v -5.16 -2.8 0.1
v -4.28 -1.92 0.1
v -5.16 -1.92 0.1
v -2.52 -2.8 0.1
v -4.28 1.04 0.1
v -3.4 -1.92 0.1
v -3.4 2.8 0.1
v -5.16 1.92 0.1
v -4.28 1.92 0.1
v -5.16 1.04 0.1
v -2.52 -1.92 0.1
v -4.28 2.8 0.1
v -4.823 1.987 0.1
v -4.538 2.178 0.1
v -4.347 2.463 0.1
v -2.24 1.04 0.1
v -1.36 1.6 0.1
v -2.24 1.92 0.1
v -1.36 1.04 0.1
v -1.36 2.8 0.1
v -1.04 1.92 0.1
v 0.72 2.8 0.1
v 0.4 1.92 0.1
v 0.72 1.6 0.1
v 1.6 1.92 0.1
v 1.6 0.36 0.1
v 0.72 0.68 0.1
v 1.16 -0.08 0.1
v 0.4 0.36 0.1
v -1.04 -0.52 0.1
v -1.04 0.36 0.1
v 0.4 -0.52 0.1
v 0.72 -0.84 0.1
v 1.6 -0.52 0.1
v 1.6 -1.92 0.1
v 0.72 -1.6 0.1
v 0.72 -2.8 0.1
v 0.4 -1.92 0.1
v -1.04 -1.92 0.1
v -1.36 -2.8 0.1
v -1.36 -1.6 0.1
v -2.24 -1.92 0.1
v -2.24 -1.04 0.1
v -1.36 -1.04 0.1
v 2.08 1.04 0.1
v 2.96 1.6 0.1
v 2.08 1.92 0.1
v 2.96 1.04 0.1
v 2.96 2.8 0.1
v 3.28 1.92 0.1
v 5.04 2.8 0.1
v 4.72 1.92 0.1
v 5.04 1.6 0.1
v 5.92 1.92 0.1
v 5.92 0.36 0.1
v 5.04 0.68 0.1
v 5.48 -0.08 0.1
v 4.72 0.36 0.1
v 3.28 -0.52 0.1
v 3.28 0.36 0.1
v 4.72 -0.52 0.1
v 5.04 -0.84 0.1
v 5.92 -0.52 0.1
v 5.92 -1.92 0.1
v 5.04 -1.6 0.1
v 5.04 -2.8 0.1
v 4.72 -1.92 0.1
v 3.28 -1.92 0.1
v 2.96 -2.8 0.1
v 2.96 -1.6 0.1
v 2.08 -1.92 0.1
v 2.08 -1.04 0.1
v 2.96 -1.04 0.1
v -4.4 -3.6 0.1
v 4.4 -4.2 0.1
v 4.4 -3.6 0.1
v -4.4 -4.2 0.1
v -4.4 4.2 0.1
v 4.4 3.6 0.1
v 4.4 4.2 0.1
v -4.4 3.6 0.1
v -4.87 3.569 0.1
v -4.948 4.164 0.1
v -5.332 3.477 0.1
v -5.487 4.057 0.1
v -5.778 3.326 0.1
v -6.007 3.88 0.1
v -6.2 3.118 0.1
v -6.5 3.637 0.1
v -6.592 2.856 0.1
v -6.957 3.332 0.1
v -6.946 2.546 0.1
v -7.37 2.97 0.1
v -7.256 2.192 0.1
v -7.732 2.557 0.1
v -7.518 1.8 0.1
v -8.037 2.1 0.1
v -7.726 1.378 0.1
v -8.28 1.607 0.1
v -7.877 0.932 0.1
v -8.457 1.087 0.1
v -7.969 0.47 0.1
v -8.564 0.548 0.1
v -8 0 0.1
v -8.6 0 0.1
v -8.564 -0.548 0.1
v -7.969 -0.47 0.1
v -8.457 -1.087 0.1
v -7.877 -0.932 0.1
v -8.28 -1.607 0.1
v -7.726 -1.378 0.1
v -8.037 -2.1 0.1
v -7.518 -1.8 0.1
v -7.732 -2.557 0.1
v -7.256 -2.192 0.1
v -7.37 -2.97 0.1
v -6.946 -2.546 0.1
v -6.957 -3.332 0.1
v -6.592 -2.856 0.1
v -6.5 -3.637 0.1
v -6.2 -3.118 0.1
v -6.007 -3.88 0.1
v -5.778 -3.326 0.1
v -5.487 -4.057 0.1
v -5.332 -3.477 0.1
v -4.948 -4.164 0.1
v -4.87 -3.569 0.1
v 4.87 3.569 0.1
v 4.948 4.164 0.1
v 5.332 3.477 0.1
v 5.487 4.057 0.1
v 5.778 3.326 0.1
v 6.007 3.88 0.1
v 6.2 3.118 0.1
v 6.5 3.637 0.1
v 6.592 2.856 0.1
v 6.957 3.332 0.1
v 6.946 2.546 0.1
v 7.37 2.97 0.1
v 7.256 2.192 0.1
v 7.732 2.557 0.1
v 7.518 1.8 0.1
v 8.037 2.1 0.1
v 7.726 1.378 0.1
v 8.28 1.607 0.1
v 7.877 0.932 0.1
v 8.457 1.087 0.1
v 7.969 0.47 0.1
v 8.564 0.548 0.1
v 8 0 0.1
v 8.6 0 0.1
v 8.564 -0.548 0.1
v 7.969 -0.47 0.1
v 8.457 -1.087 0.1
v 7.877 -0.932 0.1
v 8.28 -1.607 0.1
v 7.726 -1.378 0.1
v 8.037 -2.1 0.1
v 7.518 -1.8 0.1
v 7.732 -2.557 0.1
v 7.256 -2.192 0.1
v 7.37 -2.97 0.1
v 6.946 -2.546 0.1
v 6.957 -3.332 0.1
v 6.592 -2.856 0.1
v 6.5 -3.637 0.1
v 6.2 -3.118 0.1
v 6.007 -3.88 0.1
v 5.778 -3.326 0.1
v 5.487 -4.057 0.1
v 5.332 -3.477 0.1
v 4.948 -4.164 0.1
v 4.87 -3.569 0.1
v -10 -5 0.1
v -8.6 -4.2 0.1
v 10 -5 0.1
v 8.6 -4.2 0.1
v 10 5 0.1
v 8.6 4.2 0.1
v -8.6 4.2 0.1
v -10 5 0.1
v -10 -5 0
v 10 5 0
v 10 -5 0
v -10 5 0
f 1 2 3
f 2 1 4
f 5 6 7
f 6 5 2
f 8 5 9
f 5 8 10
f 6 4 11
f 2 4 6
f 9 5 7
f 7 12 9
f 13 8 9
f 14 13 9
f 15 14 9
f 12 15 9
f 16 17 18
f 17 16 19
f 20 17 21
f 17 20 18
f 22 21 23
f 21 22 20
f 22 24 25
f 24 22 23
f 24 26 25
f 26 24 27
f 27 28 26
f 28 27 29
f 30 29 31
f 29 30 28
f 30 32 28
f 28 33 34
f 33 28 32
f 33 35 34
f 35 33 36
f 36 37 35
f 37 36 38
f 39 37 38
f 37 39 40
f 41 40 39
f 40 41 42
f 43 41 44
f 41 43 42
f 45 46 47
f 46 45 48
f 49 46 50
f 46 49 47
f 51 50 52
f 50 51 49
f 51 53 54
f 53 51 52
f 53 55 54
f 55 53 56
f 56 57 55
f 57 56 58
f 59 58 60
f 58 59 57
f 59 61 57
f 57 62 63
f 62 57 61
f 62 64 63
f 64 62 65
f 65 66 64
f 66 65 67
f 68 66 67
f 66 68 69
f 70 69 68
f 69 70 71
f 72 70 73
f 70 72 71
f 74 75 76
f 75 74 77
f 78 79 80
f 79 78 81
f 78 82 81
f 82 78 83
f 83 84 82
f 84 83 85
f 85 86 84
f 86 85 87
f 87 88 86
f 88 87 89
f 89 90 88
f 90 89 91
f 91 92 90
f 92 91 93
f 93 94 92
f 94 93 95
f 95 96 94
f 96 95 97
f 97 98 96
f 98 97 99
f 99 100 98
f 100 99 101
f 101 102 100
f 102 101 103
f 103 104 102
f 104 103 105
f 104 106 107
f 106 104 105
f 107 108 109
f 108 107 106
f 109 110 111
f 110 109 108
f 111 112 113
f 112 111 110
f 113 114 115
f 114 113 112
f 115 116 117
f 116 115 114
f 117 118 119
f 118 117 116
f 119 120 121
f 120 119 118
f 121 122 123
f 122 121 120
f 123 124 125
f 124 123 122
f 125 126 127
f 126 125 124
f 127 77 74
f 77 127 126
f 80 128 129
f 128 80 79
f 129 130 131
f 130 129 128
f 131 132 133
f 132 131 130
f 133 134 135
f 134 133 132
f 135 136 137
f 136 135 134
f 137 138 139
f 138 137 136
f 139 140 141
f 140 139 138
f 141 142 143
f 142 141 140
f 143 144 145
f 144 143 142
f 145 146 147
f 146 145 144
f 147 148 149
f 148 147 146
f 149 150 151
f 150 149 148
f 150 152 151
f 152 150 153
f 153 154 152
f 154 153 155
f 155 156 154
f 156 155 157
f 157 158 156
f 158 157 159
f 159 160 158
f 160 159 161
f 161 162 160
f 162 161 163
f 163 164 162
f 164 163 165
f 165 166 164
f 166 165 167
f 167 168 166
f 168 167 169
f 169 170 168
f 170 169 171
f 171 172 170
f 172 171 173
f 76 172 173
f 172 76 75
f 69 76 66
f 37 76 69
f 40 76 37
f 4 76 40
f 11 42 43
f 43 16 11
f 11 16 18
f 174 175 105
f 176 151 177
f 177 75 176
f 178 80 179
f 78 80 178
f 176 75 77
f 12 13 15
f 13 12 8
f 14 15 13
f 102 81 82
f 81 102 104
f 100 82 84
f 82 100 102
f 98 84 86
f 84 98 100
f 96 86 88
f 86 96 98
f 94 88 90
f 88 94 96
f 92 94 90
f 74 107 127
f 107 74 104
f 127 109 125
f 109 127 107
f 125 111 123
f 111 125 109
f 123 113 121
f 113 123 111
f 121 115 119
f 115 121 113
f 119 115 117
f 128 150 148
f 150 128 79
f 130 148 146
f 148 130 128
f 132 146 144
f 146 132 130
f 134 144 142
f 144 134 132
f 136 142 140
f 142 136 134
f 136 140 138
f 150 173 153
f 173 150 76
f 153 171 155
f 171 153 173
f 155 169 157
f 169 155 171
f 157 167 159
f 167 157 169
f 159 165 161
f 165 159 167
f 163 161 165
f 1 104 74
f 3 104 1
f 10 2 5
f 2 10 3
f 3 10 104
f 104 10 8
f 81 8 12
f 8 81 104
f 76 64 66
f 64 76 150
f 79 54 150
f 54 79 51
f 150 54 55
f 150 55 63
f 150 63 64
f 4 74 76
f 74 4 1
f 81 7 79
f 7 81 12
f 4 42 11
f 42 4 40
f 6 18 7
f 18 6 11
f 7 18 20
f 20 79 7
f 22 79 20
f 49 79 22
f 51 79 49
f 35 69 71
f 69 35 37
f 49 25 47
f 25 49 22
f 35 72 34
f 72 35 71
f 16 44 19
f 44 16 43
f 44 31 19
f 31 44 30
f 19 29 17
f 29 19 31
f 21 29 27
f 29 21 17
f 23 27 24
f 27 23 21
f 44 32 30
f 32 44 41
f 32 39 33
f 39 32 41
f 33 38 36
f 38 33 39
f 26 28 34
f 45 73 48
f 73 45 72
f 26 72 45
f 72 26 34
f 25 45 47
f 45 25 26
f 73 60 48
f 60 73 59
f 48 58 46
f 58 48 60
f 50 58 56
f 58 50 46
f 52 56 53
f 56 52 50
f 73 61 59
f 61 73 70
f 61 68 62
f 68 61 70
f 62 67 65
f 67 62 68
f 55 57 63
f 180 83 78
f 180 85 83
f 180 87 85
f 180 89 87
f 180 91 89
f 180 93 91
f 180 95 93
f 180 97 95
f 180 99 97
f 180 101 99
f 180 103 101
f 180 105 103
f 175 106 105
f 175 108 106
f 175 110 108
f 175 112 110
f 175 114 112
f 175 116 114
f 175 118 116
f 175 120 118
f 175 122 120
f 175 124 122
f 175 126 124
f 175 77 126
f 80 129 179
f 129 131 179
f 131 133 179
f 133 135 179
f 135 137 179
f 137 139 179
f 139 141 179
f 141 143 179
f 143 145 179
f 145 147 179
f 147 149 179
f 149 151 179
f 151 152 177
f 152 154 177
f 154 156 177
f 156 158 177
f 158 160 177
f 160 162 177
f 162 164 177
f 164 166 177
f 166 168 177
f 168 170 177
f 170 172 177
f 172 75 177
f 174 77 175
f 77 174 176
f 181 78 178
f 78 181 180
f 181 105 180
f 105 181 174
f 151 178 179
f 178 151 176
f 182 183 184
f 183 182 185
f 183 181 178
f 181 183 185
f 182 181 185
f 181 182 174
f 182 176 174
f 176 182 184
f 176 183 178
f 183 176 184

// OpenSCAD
// file: ../p/box5-12.scad
use <../lib.scad>
function ldraw_lib__box5_12() = [
// 0 Box with 5 Faces without Any Edges
// 0 Name: box5-12.dat
// 0 Author: Chris Dee [cwdee]
// 0 !LDRAW_ORG Primitive UPDATE 2009-02
// 0 !LICENSE Licensed under CC BY 2.0 and CC BY 4.0 : see CAreadme.txt
// 
// 0 BFC CERTIFY CCW
  [0,"BFC","CERTIFY"],
  [0,"BFC","CCW"],
// 
// 0 !HISTORY 2009-09-03 [PTadmin] Official Update 2009-02
// 
// 
// 4 16 1 1 1 1 1 -1 -1 1 -1 -1 1 1
  [4,16,1,1,1,1,1,-1,-1,1,-1,-1,1,1],
// 4 16 -1 0 1 1 0 1 1 1 1 -1 1 1
  [4,16,-1,0,1,1,0,1,1,1,1,-1,1,1],
// 4 16 -1 0 -1 -1 0 1 -1 1 1 -1 1 -1
  [4,16,-1,0,-1,-1,0,1,-1,1,1,-1,1,-1],
// 4 16 1 0 -1 -1 0 -1 -1 1 -1 1 1 -1
  [4,16,1,0,-1,-1,0,-1,-1,1,-1,1,1,-1],
// 4 16 1 0 1 1 0 -1 1 1 -1 1 1 1
  [4,16,1,0,1,1,0,-1,1,1,-1,1,1,1],
// 0
];
makepoly(ldraw_lib__box5_12(), line=0.2);
// file: ../p/48/2-4ring6.scad
use <../../lib.scad>
function ldraw_lib__48__2_4ring6() = [
// 0 Hi-Res Ring  6 x 0.5
// 0 Name: 48\2-4ring6.dat
// 0 Author: Guy Vivan [guyvivan]
// 0 !LDRAW_ORG 48_Primitive UPDATE 2009-01
// 0 !LICENSE Licensed under CC BY 2.0 and CC BY 4.0 : see CAreadme.txt
// 
// 0 BFC CERTIFY CCW
  [0,"BFC","CERTIFY"],
  [0,"BFC","CCW"],
// 
// 0 !HISTORY 2009-05-02 [PTadmin] Official Update 2009-01
// 
// 
// 4 16 6 0 0 7 0 0 6.9398 0 0.9135 5.9484 0 0.783
  [4,16,6,0,0,7,0,0,6.9398,0,0.9135,5.9484,0,0.783],
// 4 16 5.9484 0 0.783 6.9398 0 0.9135 6.7613 0 1.8116 5.7954 0 1.5528
  [4,16,5.9484,0,0.783,6.9398,0,0.9135,6.7613,0,1.8116,5.7954,0,1.5528],
// 4 16 5.7954 0 1.5528 6.7613 0 1.8116 6.4673 0 2.6789 5.5434 0 2.2962
  [4,16,5.7954,0,1.5528,6.7613,0,1.8116,6.4673,0,2.6789,5.5434,0,2.2962],
// 4 16 5.5434 0 2.2962 6.4673 0 2.6789 6.062 0 3.5 5.196 0 3
  [4,16,5.5434,0,2.2962,6.4673,0,2.6789,6.062,0,3.5,5.196,0,3],
// 4 16 5.196 0 3 6.062 0 3.5 5.5538 0 4.2616 4.7604 0 3.6528
  [4,16,5.196,0,3,6.062,0,3.5,5.5538,0,4.2616,4.7604,0,3.6528],
// 4 16 4.7604 0 3.6528 5.5538 0 4.2616 4.9497 0 4.9497 4.2426 0 4.2426
  [4,16,4.7604,0,3.6528,5.5538,0,4.2616,4.9497,0,4.9497,4.2426,0,4.2426],
// 4 16 4.2426 0 4.2426 4.9497 0 4.9497 4.2616 0 5.5538 3.6528 0 4.7604
  [4,16,4.2426,0,4.2426,4.9497,0,4.9497,4.2616,0,5.5538,3.6528,0,4.7604],
// 4 16 3.6528 0 4.7604 4.2616 0 5.5538 3.5 0 6.062 3 0 5.196
  [4,16,3.6528,0,4.7604,4.2616,0,5.5538,3.5,0,6.062,3,0,5.196],
// 4 16 3 0 5.196 3.5 0 6.062 2.6789 0 6.4673 2.2962 0 5.5434
  [4,16,3,0,5.196,3.5,0,6.062,2.6789,0,6.4673,2.2962,0,5.5434],
// 4 16 2.2962 0 5.5434 2.6789 0 6.4673 1.8116 0 6.7613 1.5528 0 5.7954
  [4,16,2.2962,0,5.5434,2.6789,0,6.4673,1.8116,0,6.7613,1.5528,0,5.7954],
// 4 16 1.5528 0 5.7954 1.8116 0 6.7613 0.9135 0 6.9398 0.783 0 5.9484
  [4,16,1.5528,0,5.7954,1.8116,0,6.7613,0.9135,0,6.9398,0.783,0,5.9484],
// 4 16 0.783 0 5.9484 0.9135 0 6.9398 0 0 7 0 0 6
  [4,16,0.783,0,5.9484,0.9135,0,6.9398,0,0,7,0,0,6],
// 4 16 0 0 6 0 0 7 -0.9135 0 6.9398 -0.783 0 5.9484
  [4,16,0,0,6,0,0,7,-0.9135,0,6.9398,-0.783,0,5.9484],
// 4 16 -0.783 0 5.9484 -0.9135 0 6.9398 -1.8116 0 6.7613 -1.5528 0 5.7954
  [4,16,-0.783,0,5.9484,-0.9135,0,6.9398,-1.8116,0,6.7613,-1.5528,0,5.7954],
// 4 16 -1.5528 0 5.7954 -1.8116 0 6.7613 -2.6789 0 6.4673 -2.2962 0 5.5434
  [4,16,-1.5528,0,5.7954,-1.8116,0,6.7613,-2.6789,0,6.4673,-2.2962,0,5.5434],
// 4 16 -2.2962 0 5.5434 -2.6789 0 6.4673 -3.5 0 6.062 -3 0 5.196
  [4,16,-2.2962,0,5.5434,-2.6789,0,6.4673,-3.5,0,6.062,-3,0,5.196],
// 4 16 -3 0 5.196 -3.5 0 6.062 -4.2616 0 5.5538 -3.6528 0 4.7604
  [4,16,-3,0,5.196,-3.5,0,6.062,-4.2616,0,5.5538,-3.6528,0,4.7604],
// 4 16 -3.6528 0 4.7604 -4.2616 0 5.5538 -4.9497 0 4.9497 -4.2426 0 4.2426
  [4,16,-3.6528,0,4.7604,-4.2616,0,5.5538,-4.9497,0,4.9497,-4.2426,0,4.2426],
// 4 16 -4.2426 0 4.2426 -4.9497 0 4.9497 -5.5538 0 4.2616 -4.7604 0 3.6528
  [4,16,-4.2426,0,4.2426,-4.9497,0,4.9497,-5.5538,0,4.2616,-4.7604,0,3.6528],
// 4 16 -4.7604 0 3.6528 -5.5538 0 4.2616 -6.062 0 3.5 -5.196 0 3
  [4,16,-4.7604,0,3.6528,-5.5538,0,4.2616,-6.062,0,3.5,-5.196,0,3],
// 4 16 -5.196 0 3 -6.062 0 3.5 -6.4673 0 2.6789 -5.5434 0 2.2962
  [4,16,-5.196,0,3,-6.062,0,3.5,-6.4673,0,2.6789,-5.5434,0,2.2962],
// 4 16 -5.5434 0 2.2962 -6.4673 0 2.6789 -6.7613 0 1.8116 -5.7954 0 1.5528
  [4,16,-5.5434,0,2.2962,-6.4673,0,2.6789,-6.7613,0,1.8116,-5.7954,0,1.5528],
// 4 16 -5.7954 0 1.5528 -6.7613 0 1.8116 -6.9398 0 0.9135 -5.9484 0 0.783
  [4,16,-5.7954,0,1.5528,-6.7613,0,1.8116,-6.9398,0,0.9135,-5.9484,0,0.783],
// 4 16 -5.9484 0 0.783 -6.9398 0 0.9135 -7 0 0 -6 0 0
  [4,16,-5.9484,0,0.783,-6.9398,0,0.9135,-7,0,0,-6,0,0],
// 
// 0 end of file
// 
];
makepoly(ldraw_lib__48__2_4ring6(), line=0.2);
// file: ../p/48/2-4ndis.scad
use <../../lib.scad>
function ldraw_lib__48__2_4ndis() = [
// 0 Hi-Res Disc Negative 0.5
// 0 Name: 48\2-4ndis.dat
// 0 Author: Guy Vivan [guyvivan]
// 0 !LDRAW_ORG 48_Primitive UPDATE 2009-01
// 0 !LICENSE Licensed under CC BY 2.0 and CC BY 4.0 : see CAreadme.txt
// 
// 0 BFC CERTIFY CCW
  [0,"BFC","CERTIFY"],
  [0,"BFC","CCW"],
// 
// 0 !HISTORY 2009-05-02 [PTadmin] Official Update 2009-01
// 
// 
// 3 16 1 0 1 0.9914 0 0.1305 1 0 0
  [3,16,1,0,1,0.9914,0,0.1305,1,0,0],
// 3 16 1 0 1 0.9659 0 0.2588 0.9914 0 0.1305
  [3,16,1,0,1,0.9659,0,0.2588,0.9914,0,0.1305],
// 3 16 1 0 1 0.9239 0 0.3827 0.9659 0 0.2588
  [3,16,1,0,1,0.9239,0,0.3827,0.9659,0,0.2588],
// 3 16 1 0 1 0.866 0 0.5 0.9239 0 0.3827
  [3,16,1,0,1,0.866,0,0.5,0.9239,0,0.3827],
// 3 16 1 0 1 0.7934 0 0.6088 0.866 0 0.5
  [3,16,1,0,1,0.7934,0,0.6088,0.866,0,0.5],
// 3 16 1 0 1 0.7071 0 0.7071 0.7934 0 0.6088
  [3,16,1,0,1,0.7071,0,0.7071,0.7934,0,0.6088],
// 3 16 1 0 1 0.6088 0 0.7934 0.7071 0 0.7071
  [3,16,1,0,1,0.6088,0,0.7934,0.7071,0,0.7071],
// 3 16 1 0 1 0.5 0 0.866 0.6088 0 0.7934
  [3,16,1,0,1,0.5,0,0.866,0.6088,0,0.7934],
// 3 16 1 0 1 0.3827 0 0.9239 0.5 0 0.866
  [3,16,1,0,1,0.3827,0,0.9239,0.5,0,0.866],
// 3 16 1 0 1 0.2588 0 0.9659 0.3827 0 0.9239
  [3,16,1,0,1,0.2588,0,0.9659,0.3827,0,0.9239],
// 3 16 1 0 1 0.1305 0 0.9914 0.2588 0 0.9659
  [3,16,1,0,1,0.1305,0,0.9914,0.2588,0,0.9659],
// 3 16 1 0 1 0 0 1 0.1305 0 0.9914
  [3,16,1,0,1,0,0,1,0.1305,0,0.9914],
// 3 16 -1 0 1 -0.1305 0 0.9914 0 0 1
  [3,16,-1,0,1,-0.1305,0,0.9914,0,0,1],
// 3 16 -1 0 1 -0.2588 0 0.9659 -0.1305 0 0.9914
  [3,16,-1,0,1,-0.2588,0,0.9659,-0.1305,0,0.9914],
// 3 16 -1 0 1 -0.3827 0 0.9239 -0.2588 0 0.9659
  [3,16,-1,0,1,-0.3827,0,0.9239,-0.2588,0,0.9659],
// 3 16 -1 0 1 -0.5 0 0.866 -0.3827 0 0.9239
  [3,16,-1,0,1,-0.5,0,0.866,-0.3827,0,0.9239],
// 3 16 -1 0 1 -0.6088 0 0.7934 -0.5 0 0.866
  [3,16,-1,0,1,-0.6088,0,0.7934,-0.5,0,0.866],
// 3 16 -1 0 1 -0.7071 0 0.7071 -0.6088 0 0.7934
  [3,16,-1,0,1,-0.7071,0,0.7071,-0.6088,0,0.7934],
// 3 16 -1 0 1 -0.7934 0 0.6088 -0.7071 0 0.7071
  [3,16,-1,0,1,-0.7934,0,0.6088,-0.7071,0,0.7071],
// 3 16 -1 0 1 -0.866 0 0.5 -0.7934 0 0.6088
  [3,16,-1,0,1,-0.866,0,0.5,-0.7934,0,0.6088],
// 3 16 -1 0 1 -0.9239 0 0.3827 -0.866 0 0.5
  [3,16,-1,0,1,-0.9239,0,0.3827,-0.866,0,0.5],
// 3 16 -1 0 1 -0.9659 0 0.2588 -0.9239 0 0.3827
  [3,16,-1,0,1,-0.9659,0,0.2588,-0.9239,0,0.3827],
// 3 16 -1 0 1 -0.9914 0 0.1305 -0.9659 0 0.2588
  [3,16,-1,0,1,-0.9914,0,0.1305,-0.9659,0,0.2588],
// 3 16 -1 0 1 -1 0 0 -0.9914 0 0.1305
  [3,16,-1,0,1,-1,0,0,-0.9914,0,0.1305],
// 
// 0 end of file
// 
];
makepoly(ldraw_lib__48__2_4ndis(), line=0.2);
// file: ../p/48/1-4chrd.scad
use <../../lib.scad>
function ldraw_lib__48__1_4chrd() = [
// 0 Hi-Res Chord 0.25
// 0 Name: 48\1-4chrd.dat
// 0 Author: Andy Westrate [westrate]
// 0 !LDRAW_ORG 48_Primitive UPDATE 2012-02
// 0 !LICENSE Licensed under CC BY 2.0 and CC BY 4.0 : see CAreadme.txt
// 
// 0 BFC CERTIFY CCW
  [0,"BFC","CERTIFY"],
  [0,"BFC","CCW"],
// 
// 0 !HISTORY 2009-05-02 [PTadmin] Official Update 2009-01
// 0 !HISTORY 2012-08-02 [MMR1988] Re-creation with PrimGen2 and Rectifier
// 0 !HISTORY 2012-08-09 [PTadmin] Official Update 2012-02
// 
// 
// 4 16 0.9914 0 0.1305 0.1305 0 0.9914 0 0 1 1 0 0
  [4,16,0.9914,0,0.1305,0.1305,0,0.9914,0,0,1,1,0,0],
// 4 16 0.9659 0 0.2588 0.2588 0 0.9659 0.1305 0 0.9914 0.9914 0 0.1305
  [4,16,0.9659,0,0.2588,0.2588,0,0.9659,0.1305,0,0.9914,0.9914,0,0.1305],
// 4 16 0.9239 0 0.3827 0.3827 0 0.9239 0.2588 0 0.9659 0.9659 0 0.2588
  [4,16,0.9239,0,0.3827,0.3827,0,0.9239,0.2588,0,0.9659,0.9659,0,0.2588],
// 4 16 0.866 0 0.5 0.5 0 0.866 0.3827 0 0.9239 0.9239 0 0.3827
  [4,16,0.866,0,0.5,0.5,0,0.866,0.3827,0,0.9239,0.9239,0,0.3827],
// 4 16 0.7934 0 0.6088 0.6088 0 0.7934 0.5 0 0.866 0.866 0 0.5
  [4,16,0.7934,0,0.6088,0.6088,0,0.7934,0.5,0,0.866,0.866,0,0.5],
// 3 16 0.7071 0 0.7071 0.6088 0 0.7934 0.7934 0 0.6088
  [3,16,0.7071,0,0.7071,0.6088,0,0.7934,0.7934,0,0.6088],
];
makepoly(ldraw_lib__48__1_4chrd(), line=0.2);
// file: ../p/1-4ndis.scad
use <../lib.scad>
function ldraw_lib__1_4ndis() = [
// 0 Disc Negative 0.25
// 0 Name: 1-4ndis.dat
// 0 Author: James Jessiman
// 0 !LDRAW_ORG Primitive UPDATE 2012-01
// 0 !LICENSE Licensed under CC BY 2.0 and CC BY 4.0 : see CAreadme.txt
// 
// 0 BFC CERTIFY CCW
  [0,"BFC","CERTIFY"],
  [0,"BFC","CCW"],
// 
// 0 !HISTORY 2002-03-23 [sbliss] Added BFC Statement
// 0 !HISTORY 2002-04-25 [PTadmin] Official Update 2002-02
// 0 !HISTORY 2007-06-22 [PTadmin] Header formatted for Contributor Agreement
// 0 !HISTORY 2008-07-01 [PTadmin] Official Update 2008-01
// 0 !HISTORY 2012-02-16 [Philo] Changed to CCW
// 0 !HISTORY 2012-03-30 [PTadmin] Official Update 2012-01
// 
// 
// 3 16 0.9239 0 0.3827 1 0 0 1 0 1
  [3,16,0.9239,0,0.3827,1,0,0,1,0,1],
// 3 16 0.7071 0 0.7071 0.9239 0 0.3827 1 0 1
  [3,16,0.7071,0,0.7071,0.9239,0,0.3827,1,0,1],
// 3 16 0.3827 0 0.9239 0.7071 0 0.7071 1 0 1
  [3,16,0.3827,0,0.9239,0.7071,0,0.7071,1,0,1],
// 3 16 0 0 1 0.3827 0 0.9239 1 0 1
  [3,16,0,0,1,0.3827,0,0.9239,1,0,1],
];
makepoly(ldraw_lib__1_4ndis(), line=0.2);
// file: ../p/1-4chrd.scad
use <../lib.scad>
function ldraw_lib__1_4chrd() = [
// 0 Chord 0.25
// 0 Name: 1-4chrd.dat
// 0 Author: Tony Hafner [hafhead]
// 0 !LDRAW_ORG Primitive UPDATE 2012-02
// 0 !LICENSE Licensed under CC BY 2.0 and CC BY 4.0 : see CAreadme.txt
// 
// 0 BFC CERTIFY CCW
  [0,"BFC","CERTIFY"],
  [0,"BFC","CCW"],
// 
// 0 !HISTORY 2004-04-22 [PTadmin] Official Update 2004-02
// 0 !HISTORY 2007-10-09 [PTadmin] Header formatted for Contributor Agreement
// 0 !HISTORY 2008-07-01 [PTadmin] Official Update 2008-01
// 0 !HISTORY 2012-08-02 [MMR1988] Re-creation with PrimGen2 and Rectifier
// 0 !HISTORY 2012-08-09 [PTadmin] Official Update 2012-02
// 
// 
// 4 16 0.9239 0 0.3827 0.3827 0 0.9239 0 0 1 1 0 0
  [4,16,0.9239,0,0.3827,0.3827,0,0.9239,0,0,1,1,0,0],
// 3 16 0.7071 0 0.7071 0.3827 0 0.9239 0.9239 0 0.3827
  [3,16,0.7071,0,0.7071,0.3827,0,0.9239,0.9239,0,0.3827],
];
makepoly(ldraw_lib__1_4chrd(), line=0.2);
// main file
use <../lib.scad>
use <../p/1-4chrd.scad>
use <../p/1-4ndis.scad>
use <../p/48/1-4chrd.scad>
use <../p/48/2-4ndis.scad>
use <../p/48/2-4ring6.scad>
use <../p/box5-12.scad>
function ldraw_lib__004587a() = [
// 0 Sticker  1.2 x  2.6 with White "133" on Black
// 0 Name: 004587a.dat
// 0 Author: Niels Karsdorp [nielsk]
// 0 !LDRAW_ORG Part UPDATE 2020-01
// 0 !LICENSE Licensed under CC BY 2.0 and CC BY 4.0 : see CAreadme.txt
// 
// 0 BFC CERTIFY CCW
  [0,"BFC","CERTIFY"],
  [0,"BFC","CCW"],
// 
// 0 !KEYWORDS set 133, Train
// 
// 0 !HISTORY 2010-07-05 [PTadmin] Official Update 2010-02
// 0 !HISTORY 2016-07-01 [cwdee] Updated description
// 0 !HISTORY 2016-12-31 [PTadmin] Official Update 2016-01
// 0 !HISTORY 2019-08-10 [anathema] Corrected colour of backing box and replaced with box5-12 primitive
// 0 !HISTORY 2020-04-08 [Holly-Wood] Fixed T-Junk
// 0 !HISTORY 2020-06-28 [PTadmin] Official Update 2020-01
// 
// 
// 0 // Pattern
// 0 // White
// 4 15 -12.9 -0.25 -7 -6.3 -0.25 -7 -10.7 -0.25 -4.8 -12.9 -0.25 -4.8
  [4,15,-12.9,-0.25,-7,-6.3,-0.25,-7,-10.7,-0.25,-4.8,-12.9,-0.25,-4.8],
// 4 15 -8.5 -0.25 -4.8 -8.5 -0.25 7 -10.7 -0.25 2.6 -10.7 -0.25 -4.8
  [4,15,-8.5,-0.25,-4.8,-8.5,-0.25,7,-10.7,-0.25,2.6,-10.7,-0.25,-4.8],
// 4 15 -10.7 -0.25 4.8 -12.9 -0.25 4.8 -12.9 -0.25 2.6 -10.7 -0.25 2.6
  [4,15,-10.7,-0.25,4.8,-12.9,-0.25,4.8,-12.9,-0.25,2.6,-10.7,-0.25,2.6],
// 3 15 -8.5 -0.25 -4.8 -6.3 -0.25 -7 -6.3 -0.25 -4.8
  [3,15,-8.5,-0.25,-4.8,-6.3,-0.25,-7,-6.3,-0.25,-4.8],
// 3 15 -10.7 -0.25 -4.8 -6.3 -0.25 -7 -8.5 -0.25 -4.8
  [3,15,-10.7,-0.25,-4.8,-6.3,-0.25,-7,-8.5,-0.25,-4.8],
// 3 15 -10.7 -0.25 4.8 -10.7 -0.25 2.6 -8.5 -0.25 7
  [3,15,-10.7,-0.25,4.8,-10.7,-0.25,2.6,-8.5,-0.25,7],
// 3 15 -8.5 -0.25 7 -10.7 -0.25 7 -10.7 -0.25 4.8
  [3,15,-8.5,-0.25,7,-10.7,-0.25,7,-10.7,-0.25,4.8],
// 1 15 -12.9 -0.25 7 0 0 2.2 0 1 0 -2.2 0 0 1-4ndis.dat
  [1,15,-12.9,-0.25,7,0,0,2.2,0,1,0,-2.2,0,0, ldraw_lib__1_4ndis()],
// 4 15 -5.6 -0.25 4.8 -5.6 -0.25 2.6 -3.4 -0.25 2.6 -3.4 -0.25 4
  [4,15,-5.6,-0.25,4.8,-5.6,-0.25,2.6,-3.4,-0.25,2.6,-3.4,-0.25,4],
// 4 15 -3.4 -0.25 4 -2.6 -0.25 4.8 -3.4 -0.25 7 -5.6 -0.25 4.8
  [4,15,-3.4,-0.25,4,-2.6,-0.25,4.8,-3.4,-0.25,7,-5.6,-0.25,4.8],
// 4 15 -2.6 -0.25 4.8 1 -0.25 4.8 1.8 -0.25 7 -3.4 -0.25 7
  [4,15,-2.6,-0.25,4.8,1,-0.25,4.8,1.8,-0.25,7,-3.4,-0.25,7],
// 4 15 1 -0.25 4.8 1.8 -0.25 4 4 -0.25 4.8 1.8 -0.25 7
  [4,15,1,-0.25,4.8,1.8,-0.25,4,4,-0.25,4.8,1.8,-0.25,7],
// 4 15 1.8 -0.25 4 1.8 -0.25 1.7 4 -0.25 0.9 4 -0.25 4.8
  [4,15,1.8,-0.25,4,1.8,-0.25,1.7,4,-0.25,0.9,4,-0.25,4.8],
// 4 15 1.8 -0.25 1.7 1 -0.25 0.9 2.9 -0.25 -0.2 4 -0.25 0.9
  [4,15,1.8,-0.25,1.7,1,-0.25,0.9,2.9,-0.25,-0.2,4,-0.25,0.9],
// 4 15 1 -0.25 0.9 -2.6 -0.25 0.9 -2.6 -0.25 -1.3 2.9 -0.25 -0.2
  [4,15,1,-0.25,0.9,-2.6,-0.25,0.9,-2.6,-0.25,-1.3,2.9,-0.25,-0.2],
// 3 15 -2.6 -0.25 -1.3 1 -0.25 -1.3 2.9 -0.25 -0.2
  [3,15,-2.6,-0.25,-1.3,1,-0.25,-1.3,2.9,-0.25,-0.2],
// 4 15 1 -0.25 -1.3 1.8 -0.25 -2.1 4 -0.25 -1.3 2.9 -0.25 -0.2
  [4,15,1,-0.25,-1.3,1.8,-0.25,-2.1,4,-0.25,-1.3,2.9,-0.25,-0.2],
// 4 15 1.8 -0.25 -2.1 1.8 -0.25 -4 4 -0.25 -4.8 4 -0.25 -1.3
  [4,15,1.8,-0.25,-2.1,1.8,-0.25,-4,4,-0.25,-4.8,4,-0.25,-1.3],
// 4 15 1.8 -0.25 -4 1 -0.25 -4.8 1.8 -0.25 -7 4 -0.25 -4.8
  [4,15,1.8,-0.25,-4,1,-0.25,-4.8,1.8,-0.25,-7,4,-0.25,-4.8],
// 4 15 1 -0.25 -4.8 -2.6 -0.25 -4.8 -3.4 -0.25 -7 1.8 -0.25 -7
  [4,15,1,-0.25,-4.8,-2.6,-0.25,-4.8,-3.4,-0.25,-7,1.8,-0.25,-7],
// 4 15 -2.6 -0.25 -4.8 -3.4 -0.25 -4 -5.6 -0.25 -4.8 -3.4 -0.25 -7
  [4,15,-2.6,-0.25,-4.8,-3.4,-0.25,-4,-5.6,-0.25,-4.8,-3.4,-0.25,-7],
// 4 15 -3.4 -0.25 -4 -3.4 -0.25 -2.6 -5.6 -0.25 -2.6 -5.6 -0.25 -4.8
  [4,15,-3.4,-0.25,-4,-3.4,-0.25,-2.6,-5.6,-0.25,-2.6,-5.6,-0.25,-4.8],
// 4 15 5.2 -0.25 4.8 5.2 -0.25 2.6 7.4 -0.25 2.6 7.4 -0.25 4
  [4,15,5.2,-0.25,4.8,5.2,-0.25,2.6,7.4,-0.25,2.6,7.4,-0.25,4],
// 4 15 7.4 -0.25 4 8.2 -0.25 4.8 7.4 -0.25 7 5.2 -0.25 4.8
  [4,15,7.4,-0.25,4,8.2,-0.25,4.8,7.4,-0.25,7,5.2,-0.25,4.8],
// 4 15 8.2 -0.25 4.8 11.8 -0.25 4.8 12.6 -0.25 7 7.4 -0.25 7
  [4,15,8.2,-0.25,4.8,11.8,-0.25,4.8,12.6,-0.25,7,7.4,-0.25,7],
// 4 15 11.8 -0.25 4.8 12.6 -0.25 4 14.8 -0.25 4.8 12.6 -0.25 7
  [4,15,11.8,-0.25,4.8,12.6,-0.25,4,14.8,-0.25,4.8,12.6,-0.25,7],
// 4 15 12.6 -0.25 4 12.6 -0.25 1.7 14.8 -0.25 0.9 14.8 -0.25 4.8
  [4,15,12.6,-0.25,4,12.6,-0.25,1.7,14.8,-0.25,0.9,14.8,-0.25,4.8],
// 4 15 12.6 -0.25 1.7 11.8 -0.25 0.9 13.7 -0.25 -0.2 14.8 -0.25 0.9
  [4,15,12.6,-0.25,1.7,11.8,-0.25,0.9,13.7,-0.25,-0.2,14.8,-0.25,0.9],
// 4 15 11.8 -0.25 0.9 8.2 -0.25 0.9 8.2 -0.25 -1.3 13.7 -0.25 -0.2
  [4,15,11.8,-0.25,0.9,8.2,-0.25,0.9,8.2,-0.25,-1.3,13.7,-0.25,-0.2],
// 3 15 8.2 -0.25 -1.3 11.8 -0.25 -1.3 13.7 -0.25 -0.2
  [3,15,8.2,-0.25,-1.3,11.8,-0.25,-1.3,13.7,-0.25,-0.2],
// 4 15 11.8 -0.25 -1.3 12.6 -0.25 -2.1 14.8 -0.25 -1.3 13.7 -0.25 -0.2
  [4,15,11.8,-0.25,-1.3,12.6,-0.25,-2.1,14.8,-0.25,-1.3,13.7,-0.25,-0.2],
// 4 15 12.6 -0.25 -2.1 12.6 -0.25 -4 14.8 -0.25 -4.8 14.8 -0.25 -1.3
  [4,15,12.6,-0.25,-2.1,12.6,-0.25,-4,14.8,-0.25,-4.8,14.8,-0.25,-1.3],
// 4 15 12.6 -0.25 -4 11.8 -0.25 -4.8 12.6 -0.25 -7 14.8 -0.25 -4.8
  [4,15,12.6,-0.25,-4,11.8,-0.25,-4.8,12.6,-0.25,-7,14.8,-0.25,-4.8],
// 4 15 11.8 -0.25 -4.8 8.2 -0.25 -4.8 7.4 -0.25 -7 12.6 -0.25 -7
  [4,15,11.8,-0.25,-4.8,8.2,-0.25,-4.8,7.4,-0.25,-7,12.6,-0.25,-7],
// 4 15 8.2 -0.25 -4.8 7.4 -0.25 -4 5.2 -0.25 -4.8 7.4 -0.25 -7
  [4,15,8.2,-0.25,-4.8,7.4,-0.25,-4,5.2,-0.25,-4.8,7.4,-0.25,-7],
// 4 15 7.4 -0.25 -4 7.4 -0.25 -2.6 5.2 -0.25 -2.6 5.2 -0.25 -4.8
  [4,15,7.4,-0.25,-4,7.4,-0.25,-2.6,5.2,-0.25,-2.6,5.2,-0.25,-4.8],
// 4 15 -11 -0.25 -10.5 11 -0.25 -10.5 11 -0.25 -9 -11 -0.25 -9
  [4,15,-11,-0.25,-10.5,11,-0.25,-10.5,11,-0.25,-9,-11,-0.25,-9],
// 4 15 -11 -0.25 9 11 -0.25 9 11 -0.25 10.5 -11 -0.25 10.5
  [4,15,-11,-0.25,9,11,-0.25,9,11,-0.25,10.5,-11,-0.25,10.5],
// 1 15 -11 -0.25 0 0 0 -1.5 0 1 0 1.5 0 0 48\2-4ring6.dat
  [1,15,-11,-0.25,0,0,0,-1.5,0,1,0,1.5,0,0, ldraw_lib__48__2_4ring6()],
// 1 15 11 -0.25 0 0 0 1.5 0 1 0 1.5 0 0 48\2-4ring6.dat
  [1,15,11,-0.25,0,0,0,1.5,0,1,0,1.5,0,0, ldraw_lib__48__2_4ring6()],
// 
// 0 // Black
// 3 0 7.4 -0.25 -7 11 -0.25 -9 12.6 -0.25 -7
  [3,0,7.4,-0.25,-7,11,-0.25,-9,12.6,-0.25,-7],
// 3 0 1.8 -0.25 -7 11 -0.25 -9 7.4 -0.25 -7
  [3,0,1.8,-0.25,-7,11,-0.25,-9,7.4,-0.25,-7],
// 3 0 -3.4 -0.25 -7 11 -0.25 -9 1.8 -0.25 -7
  [3,0,-3.4,-0.25,-7,11,-0.25,-9,1.8,-0.25,-7],
// 3 0 -6.3 -0.25 -7 11 -0.25 -9 -3.4 -0.25 -7
  [3,0,-6.3,-0.25,-7,11,-0.25,-9,-3.4,-0.25,-7],
// 3 0 -6.3 -0.25 -4.8 -5.6 -0.25 -4.8 -5.6 -0.25 -2.6
  [3,0,-6.3,-0.25,-4.8,-5.6,-0.25,-4.8,-5.6,-0.25,-2.6],
// 3 0 -5.6 -0.25 -2.6 -5.6 -0.25 2.6 -6.3 -0.25 -4.8
  [3,0,-5.6,-0.25,-2.6,-5.6,-0.25,2.6,-6.3,-0.25,-4.8],
// 3 0 -6.3 -0.25 -4.8 -5.6 -0.25 2.6 -5.6 -0.25 4.8
  [3,0,-6.3,-0.25,-4.8,-5.6,-0.25,2.6,-5.6,-0.25,4.8],
// 3 0 -25 -0.25 -12.5 -21.5 -0.25 -10.5 -21.5 -0.25 0
  [3,0,-25,-0.25,-12.5,-21.5,-0.25,-10.5,-21.5,-0.25,0],
// 3 0 25 -0.25 -12.5 21.5 -0.25 0 21.5 -0.25 -10.5
  [3,0,25,-0.25,-12.5,21.5,-0.25,0,21.5,-0.25,-10.5],
// 3 0 21.5 -0.25 -10.5 11 -0.25 -10.5 25 -0.25 -12.5
  [3,0,21.5,-0.25,-10.5,11,-0.25,-10.5,25,-0.25,-12.5],
// 3 0 25 -0.25 12.5 11 -0.25 10.5 21.5 -0.25 10.5
  [3,0,25,-0.25,12.5,11,-0.25,10.5,21.5,-0.25,10.5],
// 3 0 -11 -0.25 10.5 11 -0.25 10.5 25 -0.25 12.5
  [3,0,-11,-0.25,10.5,11,-0.25,10.5,25,-0.25,12.5],
// 3 0 25 -0.25 -12.5 11 -0.25 -10.5 -11 -0.25 -10.5
  [3,0,25,-0.25,-12.5,11,-0.25,-10.5,-11,-0.25,-10.5],
// 1 0 -12.9 -0.25 7 0 0 2.2 0 1 0 -2.2 0 0 1-4chrd.dat
  [1,0,-12.9,-0.25,7,0,0,2.2,0,1,0,-2.2,0,0, ldraw_lib__1_4chrd()],
// 1 0 -11 -0.25 0 0 0 -9 0 1 0 9 0 0 48\1-4chrd.dat
  [1,0,-11,-0.25,0,0,0,-9,0,1,0,9,0,0, ldraw_lib__48__1_4chrd()],
// 1 0 -11 -0.25 0 0 0 -9 0 1 0 -9 0 0 48\1-4chrd.dat
  [1,0,-11,-0.25,0,0,0,-9,0,1,0,-9,0,0, ldraw_lib__48__1_4chrd()],
// 1 0 11 -0.25 0 0 0 9 0 1 0 9 0 0 48\1-4chrd.dat
  [1,0,11,-0.25,0,0,0,9,0,1,0,9,0,0, ldraw_lib__48__1_4chrd()],
// 1 0 11 -0.25 0 0 0 9 0 1 0 -9 0 0 48\1-4chrd.dat
  [1,0,11,-0.25,0,0,0,9,0,1,0,-9,0,0, ldraw_lib__48__1_4chrd()],
// 3 0 -12.9 -0.25 -7 -20 -0.25 0 -11 -0.25 -9
  [3,0,-12.9,-0.25,-7,-20,-0.25,0,-11,-0.25,-9],
// 3 0 -12.9 -0.25 -4.8 -20 -0.25 0 -12.9 -0.25 -7
  [3,0,-12.9,-0.25,-4.8,-20,-0.25,0,-12.9,-0.25,-7],
// 4 0 -12.9 -0.25 -4.8 -10.7 -0.25 -4.8 -10.7 -0.25 2.6 -12.9 -0.25 2.6
  [4,0,-12.9,-0.25,-4.8,-10.7,-0.25,-4.8,-10.7,-0.25,2.6,-12.9,-0.25,2.6],
// 3 0 -12.9 -0.25 -4.8 -12.9 -0.25 2.6 -20 -0.25 0
  [3,0,-12.9,-0.25,-4.8,-12.9,-0.25,2.6,-20,-0.25,0],
// 3 0 -20 -0.25 0 -12.9 -0.25 2.6 -12.9 -0.25 4.8
  [3,0,-20,-0.25,0,-12.9,-0.25,2.6,-12.9,-0.25,4.8],
// 4 0 -20 -0.25 0 -12.9 -0.25 4.8 -10.7 -0.25 7 -11 -0.25 9
  [4,0,-20,-0.25,0,-12.9,-0.25,4.8,-10.7,-0.25,7,-11,-0.25,9],
// 4 0 11 -0.25 -9 20 -0.25 0 14.8 -0.25 -4.8 12.6 -0.25 -7
  [4,0,11,-0.25,-9,20,-0.25,0,14.8,-0.25,-4.8,12.6,-0.25,-7],
// 4 0 12.6 -0.25 7 14.8 -0.25 4.8 20 -0.25 0 11 -0.25 9
  [4,0,12.6,-0.25,7,14.8,-0.25,4.8,20,-0.25,0,11,-0.25,9],
// 3 0 20 -.25 0 14.8 -.25 4.8 14.8 -.25 .9
  [3,0,20,-.25,0,14.8,-.25,4.8,14.8,-.25,.9],
// 3 0 20 -.25 0 14.8 -.25 .9 14.8 -.25 -1.3
  [3,0,20,-.25,0,14.8,-.25,.9,14.8,-.25,-1.3],
// 3 0 20 -.25 0 14.8 -.25 -1.3 14.8 -.25 -4.8
  [3,0,20,-.25,0,14.8,-.25,-1.3,14.8,-.25,-4.8],
// 4 0 -11 -0.25 -9 11 -0.25 -9 -6.3 -0.25 -7 -12.9 -0.25 -7
  [4,0,-11,-0.25,-9,11,-0.25,-9,-6.3,-0.25,-7,-12.9,-0.25,-7],
// 4 0 -11 -0.25 9 -10.7 -0.25 7 -8.5 -0.25 7 11 -0.25 9
  [4,0,-11,-0.25,9,-10.7,-0.25,7,-8.5,-0.25,7,11,-0.25,9],
// 4 0 -6.3 -0.25 -7 -3.4 -0.25 -7 -5.6 -0.25 -4.8 -6.3 -0.25 -4.8
  [4,0,-6.3,-0.25,-7,-3.4,-0.25,-7,-5.6,-0.25,-4.8,-6.3,-0.25,-4.8],
// 4 0 -8.5 -0.25 -4.8 -6.3 -0.25 -4.8 -5.6 -0.25 4.8 -8.5 -0.25 7
  [4,0,-8.5,-0.25,-4.8,-6.3,-0.25,-4.8,-5.6,-0.25,4.8,-8.5,-0.25,7],
// 3 0 -8.5 -0.25 7 -5.6 -0.25 4.8 -3.4 -0.25 7
  [3,0,-8.5,-0.25,7,-5.6,-0.25,4.8,-3.4,-0.25,7],
// 3 0 -3.4 -0.25 7 11 -0.25 9 -8.5 -0.25 7
  [3,0,-3.4,-0.25,7,11,-0.25,9,-8.5,-0.25,7],
// 3 0 1.8 -0.25 7 11 -0.25 9 -3.4 -0.25 7
  [3,0,1.8,-0.25,7,11,-0.25,9,-3.4,-0.25,7],
// 3 0 7.4 -0.25 7 11 -0.25 9 1.8 -0.25 7
  [3,0,7.4,-0.25,7,11,-0.25,9,1.8,-0.25,7],
// 3 0 12.6 -0.25 7 11 -0.25 9 7.4 -0.25 7
  [3,0,12.6,-0.25,7,11,-0.25,9,7.4,-0.25,7],
// 4 0 1.8 -0.25 -7 7.4 -0.25 -7 5.2 -0.25 -4.8 4 -0.25 -4.8
  [4,0,1.8,-0.25,-7,7.4,-0.25,-7,5.2,-0.25,-4.8,4,-0.25,-4.8],
// 4 0 4 -0.25 4.8 5.2 -0.25 4.8 7.4 -0.25 7 1.8 -0.25 7
  [4,0,4,-0.25,4.8,5.2,-0.25,4.8,7.4,-0.25,7,1.8,-0.25,7],
// 4 0 4 -0.25 -4.8 5.2 -0.25 -4.8 5.2 -0.25 -2.6 4 -0.25 -1.3
  [4,0,4,-0.25,-4.8,5.2,-0.25,-4.8,5.2,-0.25,-2.6,4,-0.25,-1.3],
// 4 0 -5.6 -0.25 2.6 -5.6 -0.25 -2.6 -3.4 -0.25 -2.6 -3.4 -0.25 2.6
  [4,0,-5.6,-0.25,2.6,-5.6,-0.25,-2.6,-3.4,-0.25,-2.6,-3.4,-0.25,2.6],
// 4 0 -3.4 -0.25 2.6 -3.4 -0.25 -2.6 -2.6 -0.25 -1.3 -2.6 -0.25 0.9
  [4,0,-3.4,-0.25,2.6,-3.4,-0.25,-2.6,-2.6,-0.25,-1.3,-2.6,-0.25,0.9],
// 4 0 -3.4 -0.25 4 -3.4 -0.25 2.6 -2.6 -0.25 0.9 1 -0.25 0.9
  [4,0,-3.4,-0.25,4,-3.4,-0.25,2.6,-2.6,-0.25,0.9,1,-0.25,0.9],
// 4 0 -2.6 -0.25 4.8 -3.4 -0.25 4 1 -0.25 0.9 1.8 -0.25 1.7
  [4,0,-2.6,-0.25,4.8,-3.4,-0.25,4,1,-0.25,0.9,1.8,-0.25,1.7],
// 4 0 1 -0.25 4.8 -2.6 -0.25 4.8 1.8 -0.25 1.7 1.8 -0.25 4
  [4,0,1,-0.25,4.8,-2.6,-0.25,4.8,1.8,-0.25,1.7,1.8,-0.25,4],
// 4 0 1 -0.25 -1.3 -2.6 -0.25 -1.3 -3.4 -0.25 -2.6 -3.4 -0.25 -4
  [4,0,1,-0.25,-1.3,-2.6,-0.25,-1.3,-3.4,-0.25,-2.6,-3.4,-0.25,-4],
// 4 0 1.8 -0.25 -2.1 1 -0.25 -1.3 -3.4 -0.25 -4 -2.6 -0.25 -4.8
  [4,0,1.8,-0.25,-2.1,1,-0.25,-1.3,-3.4,-0.25,-4,-2.6,-0.25,-4.8],
// 4 0 1.8 -0.25 -4 1.8 -0.25 -2.1 -2.6 -0.25 -4.8 1 -0.25 -4.8
  [4,0,1.8,-0.25,-4,1.8,-0.25,-2.1,-2.6,-0.25,-4.8,1,-0.25,-4.8],
// 3 0 4 -0.25 0.9 2.9 -0.25 -0.2 4 -0.25 -1.3
  [3,0,4,-0.25,0.9,2.9,-0.25,-0.2,4,-0.25,-1.3],
// 4 0 5.2 -0.25 2.6 5.2 -0.25 -2.6 7.4 -0.25 -2.6 7.4 -0.25 2.6
  [4,0,5.2,-0.25,2.6,5.2,-0.25,-2.6,7.4,-0.25,-2.6,7.4,-0.25,2.6],
// 4 0 4 -0.25 0.9 4 -0.25 -1.3 5.2 -0.25 -2.6 5.2 -0.25 2.6
  [4,0,4,-0.25,0.9,4,-0.25,-1.3,5.2,-0.25,-2.6,5.2,-0.25,2.6],
// 4 0 5.2 -0.25 2.6 5.2 -0.25 4.8 4 -0.25 4.8 4 -0.25 0.9
  [4,0,5.2,-0.25,2.6,5.2,-0.25,4.8,4,-0.25,4.8,4,-0.25,0.9],
// 4 0 7.4 -0.25 2.6 7.4 -0.25 -2.6 8.2 -0.25 -1.3 8.2 -0.25 0.9
  [4,0,7.4,-0.25,2.6,7.4,-0.25,-2.6,8.2,-0.25,-1.3,8.2,-0.25,0.9],
// 4 0 7.4 -0.25 4 7.4 -0.25 2.6 8.2 -0.25 0.9 11.8 -0.25 0.9
  [4,0,7.4,-0.25,4,7.4,-0.25,2.6,8.2,-0.25,0.9,11.8,-0.25,0.9],
// 4 0 8.2 -0.25 4.8 7.4 -0.25 4 11.8 -0.25 0.9 12.6 -0.25 1.7
  [4,0,8.2,-0.25,4.8,7.4,-0.25,4,11.8,-0.25,0.9,12.6,-0.25,1.7],
// 4 0 11.8 -0.25 4.8 8.2 -0.25 4.8 12.6 -0.25 1.7 12.6 -0.25 4
  [4,0,11.8,-0.25,4.8,8.2,-0.25,4.8,12.6,-0.25,1.7,12.6,-0.25,4],
// 4 0 11.8 -0.25 -1.3 8.2 -0.25 -1.3 7.4 -0.25 -2.6 7.4 -0.25 -4
  [4,0,11.8,-0.25,-1.3,8.2,-0.25,-1.3,7.4,-0.25,-2.6,7.4,-0.25,-4],
// 4 0 12.6 -0.25 -2.1 11.8 -0.25 -1.3 7.4 -0.25 -4 8.2 -0.25 -4.8
  [4,0,12.6,-0.25,-2.1,11.8,-0.25,-1.3,7.4,-0.25,-4,8.2,-0.25,-4.8],
// 4 0 12.6 -0.25 -4 12.6 -0.25 -2.1 8.2 -0.25 -4.8 11.8 -0.25 -4.8
  [4,0,12.6,-0.25,-4,12.6,-0.25,-2.1,8.2,-0.25,-4.8,11.8,-0.25,-4.8],
// 3 0 14.8 -0.25 0.9 13.7 -0.25 -0.2 14.8 -0.25 -1.3
  [3,0,14.8,-0.25,0.9,13.7,-0.25,-0.2,14.8,-0.25,-1.3],
// 1 0 -11 -0.25 0 0 0 -10.5 0 1 0 10.5 0 0 48\2-4ndis.dat
  [1,0,-11,-0.25,0,0,0,-10.5,0,1,0,10.5,0,0, ldraw_lib__48__2_4ndis()],
// 1 0 11 -0.25 0 0 0 10.5 0 1 0 10.5 0 0 48\2-4ndis.dat
  [1,0,11,-0.25,0,0,0,10.5,0,1,0,10.5,0,0, ldraw_lib__48__2_4ndis()],
// 4 0 -25 -0.25 -12.5 25 -0.25 -12.5 -11 -0.25 -10.5 -21.5 -0.25 -10.5
  [4,0,-25,-0.25,-12.5,25,-0.25,-12.5,-11,-0.25,-10.5,-21.5,-0.25,-10.5],
// 4 0 -21.5 -0.25 10.5 -11 -0.25 10.5 25 -0.25 12.5 -25 -0.25 12.5
  [4,0,-21.5,-0.25,10.5,-11,-0.25,10.5,25,-0.25,12.5,-25,-0.25,12.5],
// 4 0 -25 -0.25 12.5 -25 -0.25 -12.5 -21.5 -0.25 0 -21.5 -0.25 10.5
  [4,0,-25,-0.25,12.5,-25,-0.25,-12.5,-21.5,-0.25,0,-21.5,-0.25,10.5],
// 4 0 21.5 -0.25 10.5 21.5 -0.25 0 25 -0.25 -12.5 25 -0.25 12.5
  [4,0,21.5,-0.25,10.5,21.5,-0.25,0,25,-0.25,-12.5,25,-0.25,12.5],
// 
// 0 // Small Box
// 1 16 0 -0.25 0 25 0 0 0 0.25 0 0 0 12.5 box5-12.dat
  [1,16,0,-0.25,0,25,0,0,0,0.25,0,0,0,12.5, ldraw_lib__box5_12()],
];
makepoly(ldraw_lib__004587a(), line=0.2);
